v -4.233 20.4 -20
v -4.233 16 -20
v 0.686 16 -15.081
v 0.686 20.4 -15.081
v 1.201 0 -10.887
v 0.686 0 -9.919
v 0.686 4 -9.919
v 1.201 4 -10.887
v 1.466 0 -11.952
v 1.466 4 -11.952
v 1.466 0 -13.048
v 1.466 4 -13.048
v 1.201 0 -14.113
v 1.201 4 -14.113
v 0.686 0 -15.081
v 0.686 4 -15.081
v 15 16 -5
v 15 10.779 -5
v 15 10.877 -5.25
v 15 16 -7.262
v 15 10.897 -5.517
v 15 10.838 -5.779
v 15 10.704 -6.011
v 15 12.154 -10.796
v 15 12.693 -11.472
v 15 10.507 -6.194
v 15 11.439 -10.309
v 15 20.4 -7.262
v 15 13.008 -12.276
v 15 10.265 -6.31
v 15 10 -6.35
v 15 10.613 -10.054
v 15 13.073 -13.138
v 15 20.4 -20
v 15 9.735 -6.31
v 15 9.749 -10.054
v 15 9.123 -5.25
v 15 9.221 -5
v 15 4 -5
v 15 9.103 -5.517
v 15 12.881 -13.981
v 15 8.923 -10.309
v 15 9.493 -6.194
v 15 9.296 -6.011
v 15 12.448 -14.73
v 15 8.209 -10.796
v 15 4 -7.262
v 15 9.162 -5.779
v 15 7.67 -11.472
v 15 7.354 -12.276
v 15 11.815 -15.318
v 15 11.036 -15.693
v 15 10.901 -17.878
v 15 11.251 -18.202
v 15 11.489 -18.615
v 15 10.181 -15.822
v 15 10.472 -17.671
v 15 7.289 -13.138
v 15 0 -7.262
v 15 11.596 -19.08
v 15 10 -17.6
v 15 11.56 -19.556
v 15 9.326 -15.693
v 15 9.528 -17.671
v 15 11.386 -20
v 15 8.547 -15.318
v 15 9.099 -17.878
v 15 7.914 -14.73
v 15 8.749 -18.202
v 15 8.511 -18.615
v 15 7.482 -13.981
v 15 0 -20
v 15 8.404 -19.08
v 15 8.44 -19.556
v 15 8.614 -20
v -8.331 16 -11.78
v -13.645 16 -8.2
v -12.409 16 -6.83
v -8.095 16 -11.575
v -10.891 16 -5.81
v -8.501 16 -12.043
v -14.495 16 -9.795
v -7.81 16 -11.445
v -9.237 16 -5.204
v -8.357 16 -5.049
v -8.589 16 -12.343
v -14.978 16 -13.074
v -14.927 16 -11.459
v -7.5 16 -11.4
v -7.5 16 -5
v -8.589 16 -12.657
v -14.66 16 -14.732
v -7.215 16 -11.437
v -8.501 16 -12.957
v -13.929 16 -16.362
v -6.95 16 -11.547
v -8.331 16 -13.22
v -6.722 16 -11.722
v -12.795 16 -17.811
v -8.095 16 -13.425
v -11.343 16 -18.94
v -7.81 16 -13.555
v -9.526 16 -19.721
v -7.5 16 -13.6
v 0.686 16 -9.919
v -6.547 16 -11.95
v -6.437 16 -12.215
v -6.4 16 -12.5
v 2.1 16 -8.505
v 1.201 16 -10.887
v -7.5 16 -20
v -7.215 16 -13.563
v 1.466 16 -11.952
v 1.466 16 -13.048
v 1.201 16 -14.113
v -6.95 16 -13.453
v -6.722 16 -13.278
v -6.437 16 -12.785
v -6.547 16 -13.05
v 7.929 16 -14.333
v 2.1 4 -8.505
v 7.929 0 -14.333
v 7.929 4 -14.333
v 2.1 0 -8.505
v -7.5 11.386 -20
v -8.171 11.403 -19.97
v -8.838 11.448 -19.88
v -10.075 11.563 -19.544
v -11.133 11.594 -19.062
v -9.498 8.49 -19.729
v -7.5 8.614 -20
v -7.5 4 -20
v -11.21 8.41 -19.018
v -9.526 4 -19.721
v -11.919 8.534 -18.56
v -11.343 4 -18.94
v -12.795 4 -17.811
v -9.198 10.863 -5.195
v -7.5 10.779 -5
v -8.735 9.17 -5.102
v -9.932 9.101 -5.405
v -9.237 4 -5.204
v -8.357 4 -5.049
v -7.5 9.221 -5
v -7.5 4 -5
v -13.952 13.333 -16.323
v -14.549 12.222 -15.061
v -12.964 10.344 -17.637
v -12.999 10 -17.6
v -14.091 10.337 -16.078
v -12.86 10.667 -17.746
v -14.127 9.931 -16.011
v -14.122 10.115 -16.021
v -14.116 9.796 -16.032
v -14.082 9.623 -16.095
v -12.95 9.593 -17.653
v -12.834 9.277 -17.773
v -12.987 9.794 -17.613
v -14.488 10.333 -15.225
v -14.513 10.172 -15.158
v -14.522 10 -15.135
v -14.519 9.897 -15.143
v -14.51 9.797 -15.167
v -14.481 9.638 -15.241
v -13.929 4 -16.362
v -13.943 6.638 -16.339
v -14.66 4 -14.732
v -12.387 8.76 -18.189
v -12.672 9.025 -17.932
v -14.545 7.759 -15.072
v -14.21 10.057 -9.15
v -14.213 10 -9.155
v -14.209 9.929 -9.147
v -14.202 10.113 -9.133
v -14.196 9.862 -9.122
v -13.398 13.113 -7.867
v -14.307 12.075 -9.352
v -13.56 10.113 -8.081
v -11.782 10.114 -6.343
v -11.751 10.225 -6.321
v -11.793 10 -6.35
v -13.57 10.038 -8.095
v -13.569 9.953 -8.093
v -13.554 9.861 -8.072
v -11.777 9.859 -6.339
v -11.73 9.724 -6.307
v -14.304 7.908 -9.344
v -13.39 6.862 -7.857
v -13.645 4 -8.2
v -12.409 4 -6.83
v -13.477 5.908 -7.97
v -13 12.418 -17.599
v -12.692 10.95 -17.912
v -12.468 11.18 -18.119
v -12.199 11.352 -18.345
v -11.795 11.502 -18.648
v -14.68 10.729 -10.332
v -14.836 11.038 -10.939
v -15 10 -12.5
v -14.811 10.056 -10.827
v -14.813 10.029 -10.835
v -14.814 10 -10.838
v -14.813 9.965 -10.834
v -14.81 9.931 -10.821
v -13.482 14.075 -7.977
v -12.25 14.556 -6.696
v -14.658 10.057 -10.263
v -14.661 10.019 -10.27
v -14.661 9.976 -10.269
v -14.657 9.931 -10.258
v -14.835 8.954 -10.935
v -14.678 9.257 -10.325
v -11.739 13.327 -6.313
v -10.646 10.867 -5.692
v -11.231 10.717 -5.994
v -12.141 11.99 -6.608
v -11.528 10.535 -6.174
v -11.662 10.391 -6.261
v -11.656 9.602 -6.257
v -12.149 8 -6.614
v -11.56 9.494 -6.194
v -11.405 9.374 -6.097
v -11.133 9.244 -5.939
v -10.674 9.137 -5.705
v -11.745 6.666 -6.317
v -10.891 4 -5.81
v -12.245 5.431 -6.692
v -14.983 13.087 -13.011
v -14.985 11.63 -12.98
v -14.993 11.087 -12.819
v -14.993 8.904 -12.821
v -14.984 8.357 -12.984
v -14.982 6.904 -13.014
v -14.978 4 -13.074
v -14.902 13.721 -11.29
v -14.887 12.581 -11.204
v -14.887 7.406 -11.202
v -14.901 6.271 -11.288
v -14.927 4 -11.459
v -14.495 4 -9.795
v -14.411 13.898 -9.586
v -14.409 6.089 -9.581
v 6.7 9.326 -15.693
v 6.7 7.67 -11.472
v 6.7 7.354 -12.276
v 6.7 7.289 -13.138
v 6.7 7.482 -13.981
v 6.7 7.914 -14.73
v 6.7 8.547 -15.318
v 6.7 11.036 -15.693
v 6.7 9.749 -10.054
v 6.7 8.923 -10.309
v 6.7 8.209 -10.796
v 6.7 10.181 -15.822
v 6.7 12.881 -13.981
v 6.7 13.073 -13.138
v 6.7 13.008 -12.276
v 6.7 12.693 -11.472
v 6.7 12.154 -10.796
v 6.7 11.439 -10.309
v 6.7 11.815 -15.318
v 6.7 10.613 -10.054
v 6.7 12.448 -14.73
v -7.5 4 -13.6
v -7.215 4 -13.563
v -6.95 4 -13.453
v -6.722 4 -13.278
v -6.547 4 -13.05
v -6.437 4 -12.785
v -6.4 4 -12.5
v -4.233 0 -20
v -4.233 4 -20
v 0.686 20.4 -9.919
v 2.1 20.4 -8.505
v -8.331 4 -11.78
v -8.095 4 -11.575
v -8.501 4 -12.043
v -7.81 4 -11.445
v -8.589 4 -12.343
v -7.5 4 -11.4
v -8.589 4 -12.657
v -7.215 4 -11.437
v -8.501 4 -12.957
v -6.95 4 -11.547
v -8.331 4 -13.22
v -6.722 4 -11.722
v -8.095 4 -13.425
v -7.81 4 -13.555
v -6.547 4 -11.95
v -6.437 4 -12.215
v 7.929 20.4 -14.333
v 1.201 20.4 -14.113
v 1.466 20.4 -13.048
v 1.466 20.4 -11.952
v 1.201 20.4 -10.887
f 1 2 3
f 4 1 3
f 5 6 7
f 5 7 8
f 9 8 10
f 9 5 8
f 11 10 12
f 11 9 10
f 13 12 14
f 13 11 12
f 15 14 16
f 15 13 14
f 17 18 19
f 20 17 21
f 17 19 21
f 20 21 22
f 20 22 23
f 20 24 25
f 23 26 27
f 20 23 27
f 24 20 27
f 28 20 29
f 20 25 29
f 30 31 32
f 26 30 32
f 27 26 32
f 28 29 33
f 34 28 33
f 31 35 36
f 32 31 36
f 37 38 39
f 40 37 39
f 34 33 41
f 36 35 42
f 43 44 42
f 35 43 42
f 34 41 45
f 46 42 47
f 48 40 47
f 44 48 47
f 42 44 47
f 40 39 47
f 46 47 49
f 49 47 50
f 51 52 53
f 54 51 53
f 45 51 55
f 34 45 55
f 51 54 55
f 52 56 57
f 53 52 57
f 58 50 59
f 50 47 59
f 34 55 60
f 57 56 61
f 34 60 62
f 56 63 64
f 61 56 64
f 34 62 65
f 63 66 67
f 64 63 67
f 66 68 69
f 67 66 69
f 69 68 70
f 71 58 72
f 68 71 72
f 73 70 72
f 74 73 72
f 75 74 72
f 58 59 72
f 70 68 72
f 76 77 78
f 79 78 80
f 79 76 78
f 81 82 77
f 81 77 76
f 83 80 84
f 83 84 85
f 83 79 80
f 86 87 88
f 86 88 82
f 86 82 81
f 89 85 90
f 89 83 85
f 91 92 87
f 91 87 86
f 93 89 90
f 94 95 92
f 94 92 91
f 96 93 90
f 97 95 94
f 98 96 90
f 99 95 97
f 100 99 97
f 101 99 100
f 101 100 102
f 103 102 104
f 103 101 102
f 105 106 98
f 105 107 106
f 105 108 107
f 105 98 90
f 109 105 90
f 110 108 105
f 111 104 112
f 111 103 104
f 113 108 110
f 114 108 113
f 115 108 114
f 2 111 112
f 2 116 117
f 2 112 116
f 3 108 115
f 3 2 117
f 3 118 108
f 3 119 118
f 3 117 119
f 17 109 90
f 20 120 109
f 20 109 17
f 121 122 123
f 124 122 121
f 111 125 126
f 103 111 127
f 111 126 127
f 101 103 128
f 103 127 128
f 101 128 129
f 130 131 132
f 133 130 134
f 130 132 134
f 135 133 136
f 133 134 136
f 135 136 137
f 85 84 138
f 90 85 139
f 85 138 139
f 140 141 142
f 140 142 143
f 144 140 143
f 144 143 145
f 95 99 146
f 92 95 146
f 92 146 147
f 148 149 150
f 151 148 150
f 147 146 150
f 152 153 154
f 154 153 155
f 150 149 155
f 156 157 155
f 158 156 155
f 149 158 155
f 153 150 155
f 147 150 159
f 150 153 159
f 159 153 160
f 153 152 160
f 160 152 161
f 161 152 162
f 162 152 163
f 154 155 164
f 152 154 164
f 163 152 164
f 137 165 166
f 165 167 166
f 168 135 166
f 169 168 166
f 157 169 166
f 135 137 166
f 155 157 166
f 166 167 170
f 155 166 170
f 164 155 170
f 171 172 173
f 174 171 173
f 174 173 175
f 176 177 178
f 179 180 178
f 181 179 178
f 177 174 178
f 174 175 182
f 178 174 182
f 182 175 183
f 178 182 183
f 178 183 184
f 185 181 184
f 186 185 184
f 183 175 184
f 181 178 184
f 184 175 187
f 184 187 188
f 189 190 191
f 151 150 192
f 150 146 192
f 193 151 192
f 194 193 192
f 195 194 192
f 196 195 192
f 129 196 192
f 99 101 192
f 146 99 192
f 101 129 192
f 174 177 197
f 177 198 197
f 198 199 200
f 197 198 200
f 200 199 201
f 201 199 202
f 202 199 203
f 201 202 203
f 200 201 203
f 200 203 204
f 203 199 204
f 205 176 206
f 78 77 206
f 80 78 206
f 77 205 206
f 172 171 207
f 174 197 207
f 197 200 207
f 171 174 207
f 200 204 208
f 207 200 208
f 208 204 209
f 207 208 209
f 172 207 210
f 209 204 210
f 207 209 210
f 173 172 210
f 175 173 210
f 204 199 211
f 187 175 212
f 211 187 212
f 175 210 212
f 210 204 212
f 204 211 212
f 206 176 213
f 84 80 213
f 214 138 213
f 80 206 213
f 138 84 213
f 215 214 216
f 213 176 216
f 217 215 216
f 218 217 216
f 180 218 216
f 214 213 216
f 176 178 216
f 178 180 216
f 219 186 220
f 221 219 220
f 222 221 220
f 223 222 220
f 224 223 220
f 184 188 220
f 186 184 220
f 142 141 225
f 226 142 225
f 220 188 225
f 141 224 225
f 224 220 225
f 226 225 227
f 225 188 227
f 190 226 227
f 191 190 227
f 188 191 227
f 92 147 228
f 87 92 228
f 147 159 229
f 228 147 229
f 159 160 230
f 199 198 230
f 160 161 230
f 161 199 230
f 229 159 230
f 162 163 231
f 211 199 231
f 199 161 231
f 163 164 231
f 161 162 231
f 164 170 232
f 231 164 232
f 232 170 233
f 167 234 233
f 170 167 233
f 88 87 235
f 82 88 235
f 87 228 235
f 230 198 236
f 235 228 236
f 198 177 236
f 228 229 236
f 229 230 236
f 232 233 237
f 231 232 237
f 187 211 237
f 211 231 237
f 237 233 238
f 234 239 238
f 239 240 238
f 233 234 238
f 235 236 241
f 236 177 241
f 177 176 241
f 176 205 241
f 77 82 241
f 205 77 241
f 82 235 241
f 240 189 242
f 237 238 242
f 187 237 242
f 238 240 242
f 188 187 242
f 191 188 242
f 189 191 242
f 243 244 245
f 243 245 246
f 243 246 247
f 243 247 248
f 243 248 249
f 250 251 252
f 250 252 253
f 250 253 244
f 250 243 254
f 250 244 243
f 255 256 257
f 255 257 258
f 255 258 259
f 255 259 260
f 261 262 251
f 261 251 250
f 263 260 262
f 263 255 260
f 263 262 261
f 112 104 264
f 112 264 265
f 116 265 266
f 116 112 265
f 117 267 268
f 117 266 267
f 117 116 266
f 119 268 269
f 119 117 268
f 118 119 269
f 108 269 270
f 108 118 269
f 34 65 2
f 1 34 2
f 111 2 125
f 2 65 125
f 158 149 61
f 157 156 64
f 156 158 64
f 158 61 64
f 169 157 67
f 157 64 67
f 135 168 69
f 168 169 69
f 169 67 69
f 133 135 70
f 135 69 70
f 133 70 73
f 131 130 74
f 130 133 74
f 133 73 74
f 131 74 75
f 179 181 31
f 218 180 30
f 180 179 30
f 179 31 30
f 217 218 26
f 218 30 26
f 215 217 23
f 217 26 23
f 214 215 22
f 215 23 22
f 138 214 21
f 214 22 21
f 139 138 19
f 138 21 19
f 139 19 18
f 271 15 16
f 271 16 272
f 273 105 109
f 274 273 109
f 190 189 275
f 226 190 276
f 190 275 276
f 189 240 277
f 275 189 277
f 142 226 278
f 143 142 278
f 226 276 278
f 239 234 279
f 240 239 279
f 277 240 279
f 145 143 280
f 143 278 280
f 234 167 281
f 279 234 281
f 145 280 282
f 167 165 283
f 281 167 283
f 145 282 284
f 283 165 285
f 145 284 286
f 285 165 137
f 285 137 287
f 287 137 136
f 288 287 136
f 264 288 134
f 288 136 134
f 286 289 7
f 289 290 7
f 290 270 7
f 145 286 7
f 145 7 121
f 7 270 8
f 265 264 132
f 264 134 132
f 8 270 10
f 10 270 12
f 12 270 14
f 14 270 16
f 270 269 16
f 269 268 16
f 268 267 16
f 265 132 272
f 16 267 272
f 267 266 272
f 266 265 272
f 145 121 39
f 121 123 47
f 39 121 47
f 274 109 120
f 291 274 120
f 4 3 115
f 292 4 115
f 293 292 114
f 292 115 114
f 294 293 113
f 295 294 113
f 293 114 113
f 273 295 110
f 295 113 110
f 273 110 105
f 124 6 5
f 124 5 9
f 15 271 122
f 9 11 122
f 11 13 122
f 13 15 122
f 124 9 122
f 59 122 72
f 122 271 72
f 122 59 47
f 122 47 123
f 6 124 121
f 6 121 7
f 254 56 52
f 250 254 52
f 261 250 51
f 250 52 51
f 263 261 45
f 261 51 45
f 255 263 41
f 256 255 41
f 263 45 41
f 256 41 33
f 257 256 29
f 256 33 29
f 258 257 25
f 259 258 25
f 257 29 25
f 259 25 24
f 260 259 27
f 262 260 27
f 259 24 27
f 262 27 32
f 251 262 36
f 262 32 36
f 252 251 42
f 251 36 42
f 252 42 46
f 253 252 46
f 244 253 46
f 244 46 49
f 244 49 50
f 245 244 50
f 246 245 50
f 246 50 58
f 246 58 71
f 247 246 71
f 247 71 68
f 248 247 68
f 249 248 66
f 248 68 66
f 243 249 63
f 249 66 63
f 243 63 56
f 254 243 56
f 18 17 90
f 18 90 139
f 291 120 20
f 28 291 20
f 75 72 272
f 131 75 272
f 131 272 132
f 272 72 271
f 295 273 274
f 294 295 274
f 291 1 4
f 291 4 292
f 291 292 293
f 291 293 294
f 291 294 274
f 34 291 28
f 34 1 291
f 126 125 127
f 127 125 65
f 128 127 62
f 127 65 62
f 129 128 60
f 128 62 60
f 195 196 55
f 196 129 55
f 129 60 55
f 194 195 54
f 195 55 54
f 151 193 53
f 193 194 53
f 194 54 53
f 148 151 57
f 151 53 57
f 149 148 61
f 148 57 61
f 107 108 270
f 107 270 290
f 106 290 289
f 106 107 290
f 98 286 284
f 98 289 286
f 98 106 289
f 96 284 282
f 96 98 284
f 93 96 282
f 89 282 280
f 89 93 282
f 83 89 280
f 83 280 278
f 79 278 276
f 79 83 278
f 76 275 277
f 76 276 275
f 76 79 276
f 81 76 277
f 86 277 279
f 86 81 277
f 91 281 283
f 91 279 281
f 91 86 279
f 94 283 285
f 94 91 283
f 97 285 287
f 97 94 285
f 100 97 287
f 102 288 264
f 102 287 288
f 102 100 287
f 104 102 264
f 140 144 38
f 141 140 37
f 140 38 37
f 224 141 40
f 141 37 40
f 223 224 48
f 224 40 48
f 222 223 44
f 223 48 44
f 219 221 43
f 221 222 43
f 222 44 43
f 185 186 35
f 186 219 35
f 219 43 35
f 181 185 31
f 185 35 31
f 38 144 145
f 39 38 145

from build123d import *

# Parameters (mm, degrees)
BOSS_EXTRUDE1_DEPTH                  = 16
CUT_EXTRUDE1_DEPTH                   = 4
CUT_EXTRUDE3_DEPTH                   = 30.681644331
BOSS_EXTRUDE2_DEPTH                  = 4.4
CUT_EXTRUDE9_DEPTH                   = 33.267011126
CUT_EXTRUDE9_DEPTH_BACK              = 33.267011126
CUT_EXTRUDE10_DEPTH                  = 30.899163985
CUT_EXTRUDE10_DEPTH_BACK             = 30.899163985
SKETCH15_R                           = 2.9
RUTHEX_M3_HOLE_DEPTH                 = 8.3
F_1_6MM_PTFE_TUBE_CLAMP_CUTOUT_DEPTH = 42.426561648


with BuildPart() as part:
    # Sketch1 → Boss-Extrude1 (new body)
    with BuildSketch(Plane(origin=(0, 0, 0), x_dir=(1, 0, 0), z_dir=(0, 1, 0))):
        with BuildLine():
            Line((0, 0), (15, 0))
            Line((15, 0), (15, 20))
            Line((15, 20), (-7.5, 20))
            add(Edge.make_bspline(
                [(-7.5, 20), (-15, 20), (-15, 12.5)],
                knots=[0, 0, 0, 1.570796327, 1.570796327, 1.570796327], degree=2, weights=[1, 0.707106781, 1]))
            add(Edge.make_bspline(
                [(-15, 12.5), (-15, 5), (-7.5, 5)],
                knots=[3.141592654, 3.141592654, 3.141592654, 4.71238898, 4.71238898, 4.71238898], degree=2, weights=[1, 0.707106781, 1]))
            Line((-7.5, 5), (0, 5))
            Line((0, 5), (0, 0))
        make_face()
    extrude(amount=BOSS_EXTRUDE1_DEPTH)

    # Sketch4 → Cut-Extrude1 (cut)
    with BuildSketch(Plane(origin=(0, 0, 0), x_dir=(1, 0, 0), z_dir=(0, 1, 0))):
        with BuildLine():
            Line((7.928932188, 14.333226901), (2.100397762, 8.504692474))
            Line((2.100397762, 8.504692474), (0.686184199, 9.918906036))
            ThreePointArc((0.686184199, 9.918906036), (1.5, 12.5), (0.686184199, 15.081093964))
            Line((0.686184199, 15.081093964), (-4.232721837, 20))
            Line((-4.232721837, 20), (-7.5, 20))
            add(Edge.make_bspline(
                [(-7.5, 20), (-15, 20), (-15, 12.5), (-15, 5), (-7.5, 5)],
                knots=[4.71238898, 4.71238898, 4.71238898, 6.283185307, 6.283185307, 7.853981634, 7.853981634, 7.853981634], degree=2, weights=[1, 0.707106781, 1, 0.707106781, 1]))
            Line((-7.5, 5), (0, 5))
            Line((0, 5), (0, 0))
            Line((0, 0), (15, 0))
            Line((15, 0), (15, 7.262159089))
            Line((15, 7.262159089), (7.928932188, 14.333226901))
        make_face()
    extrude(amount=CUT_EXTRUDE1_DEPTH, mode=Mode.SUBTRACT)

    # Sketch6 → Cut-Extrude3 (cut, through all)
    with BuildSketch(Plane(origin=(0, 0, 0), x_dir=(0, 0, -1), z_dir=(1, 0, 0))):
        Polygon((0, 10), (0, 10.5), (4.59413535, 10.5), (4.59413535, 5.5), (0, 5.5), align=None)
    extrude(amount=CUT_EXTRUDE3_DEPTH, mode=Mode.SUBTRACT)

    # Sketch12 → Boss-Extrude2 (add)
    with BuildSketch(Plane(origin=(0, 16, 0), x_dir=(1, 0, 0), z_dir=(0, 1, 0))):
        with BuildLine():
            Line((7.928932188, 14.333226901), (15, 7.262159089))
            Line((15, 7.262159089), (15, 20))
            Line((15, 20), (-4.232721837, 20))
            Line((-4.232721837, 20), (0.686184199, 15.081093964))
            ThreePointArc((0.686184199, 15.081093964), (1.5, 12.5), (0.686184199, 9.918906036))
            Line((0.686184199, 9.918906036), (2.100397762, 8.504692474))
            Line((2.100397762, 8.504692474), (7.928932188, 14.333226901))
        make_face()
    extrude(amount=BOSS_EXTRUDE2_DEPTH)

    # Sketch13 → Cut-Extrude9 (cut, two sides: drawn at the far end of the back side and taken through both)
    with BuildSketch(Plane.ZY.offset(-CUT_EXTRUDE9_DEPTH_BACK)):
        Polygon((0, 5.5), (-4.59413535, 5.5), (-4.59413535, 10.5), (0, 10.5), (0, 16), (-5, 16), (-5, 4), (0, 4), align=None)
    extrude(amount=CUT_EXTRUDE9_DEPTH + CUT_EXTRUDE9_DEPTH_BACK, mode=Mode.SUBTRACT)

    # Sketch14 → Cut-Extrude10 (cut, two sides: drawn at the far end of the back side and taken through both)
    with BuildSketch(Plane.XZ.offset(-4).offset(-CUT_EXTRUDE10_DEPTH_BACK)):
        with BuildLine():
            ThreePointArc((-6.4, -12.5), (-6.722182541, -11.722182541), (-7.5, -11.4))
            Line((-7.5, -11.4), (-7.5, -12.5))
            Line((-7.5, -12.5), (-7.5, -13.6))
            ThreePointArc((-7.5, -13.6), (-6.722182541, -13.277817459), (-6.4, -12.5))
        make_face()
        with BuildLine():
            Line((-7.5, -12.5), (-7.5, -11.4))
            ThreePointArc((-7.5, -11.4), (-8.6, -12.5), (-7.5, -13.6))
            Line((-7.5, -13.6), (-7.5, -12.5))
        make_face()
    extrude(amount=CUT_EXTRUDE10_DEPTH + CUT_EXTRUDE10_DEPTH_BACK, mode=Mode.SUBTRACT)

    # Sketch15 → ruthex_m3_hole (cut)
    with BuildSketch(Plane(origin=(15, 0, 0), x_dir=(0, 0, -1), z_dir=(1, 0, 0))):
        with Locations((12.921686396, 10.181082849)):
            Circle(SKETCH15_R)
    extrude(amount=-RUTHEX_M3_HOLE_DEPTH, mode=Mode.SUBTRACT)

    # Sketch16 → 1.6mm_PTFE_tube_clamp_cutout (cut, through all)
    with BuildSketch(Plane(origin=(15, 0, 0), x_dir=(0, 0, -1), z_dir=(1, 0, 0))):
        with BuildLine():
            Line((5, 10.779422863), (5, 10))
            Line((5, 10), (6.35, 10))
            ThreePointArc((6.35, 10), (5.9, 10.779422863), (5, 10.779422863))
        make_face()
        with BuildLine():
            Line((6.35, 10), (5, 10))
            Line((5, 10), (5, 9.220577137))
            ThreePointArc((5, 9.220577137), (5.9, 9.220577137), (6.35, 10))
        make_face()
        with BuildLine():
            ThreePointArc((20, 11.385640646), (18.4, 11.385640646), (17.6, 10))
            Line((17.6, 10), (20, 10))
            Line((20, 10), (20, 11.385640646))
        make_face()
        with BuildLine():
            Line((20, 10), (17.6, 10))
            ThreePointArc((17.6, 10), (18.4, 8.614359354), (20, 8.614359354))
            Line((20, 8.614359354), (20, 10))
        make_face()
    extrude(amount=-F_1_6MM_PTFE_TUBE_CLAMP_CUTOUT_DEPTH, mode=Mode.SUBTRACT)


solid = part.part
